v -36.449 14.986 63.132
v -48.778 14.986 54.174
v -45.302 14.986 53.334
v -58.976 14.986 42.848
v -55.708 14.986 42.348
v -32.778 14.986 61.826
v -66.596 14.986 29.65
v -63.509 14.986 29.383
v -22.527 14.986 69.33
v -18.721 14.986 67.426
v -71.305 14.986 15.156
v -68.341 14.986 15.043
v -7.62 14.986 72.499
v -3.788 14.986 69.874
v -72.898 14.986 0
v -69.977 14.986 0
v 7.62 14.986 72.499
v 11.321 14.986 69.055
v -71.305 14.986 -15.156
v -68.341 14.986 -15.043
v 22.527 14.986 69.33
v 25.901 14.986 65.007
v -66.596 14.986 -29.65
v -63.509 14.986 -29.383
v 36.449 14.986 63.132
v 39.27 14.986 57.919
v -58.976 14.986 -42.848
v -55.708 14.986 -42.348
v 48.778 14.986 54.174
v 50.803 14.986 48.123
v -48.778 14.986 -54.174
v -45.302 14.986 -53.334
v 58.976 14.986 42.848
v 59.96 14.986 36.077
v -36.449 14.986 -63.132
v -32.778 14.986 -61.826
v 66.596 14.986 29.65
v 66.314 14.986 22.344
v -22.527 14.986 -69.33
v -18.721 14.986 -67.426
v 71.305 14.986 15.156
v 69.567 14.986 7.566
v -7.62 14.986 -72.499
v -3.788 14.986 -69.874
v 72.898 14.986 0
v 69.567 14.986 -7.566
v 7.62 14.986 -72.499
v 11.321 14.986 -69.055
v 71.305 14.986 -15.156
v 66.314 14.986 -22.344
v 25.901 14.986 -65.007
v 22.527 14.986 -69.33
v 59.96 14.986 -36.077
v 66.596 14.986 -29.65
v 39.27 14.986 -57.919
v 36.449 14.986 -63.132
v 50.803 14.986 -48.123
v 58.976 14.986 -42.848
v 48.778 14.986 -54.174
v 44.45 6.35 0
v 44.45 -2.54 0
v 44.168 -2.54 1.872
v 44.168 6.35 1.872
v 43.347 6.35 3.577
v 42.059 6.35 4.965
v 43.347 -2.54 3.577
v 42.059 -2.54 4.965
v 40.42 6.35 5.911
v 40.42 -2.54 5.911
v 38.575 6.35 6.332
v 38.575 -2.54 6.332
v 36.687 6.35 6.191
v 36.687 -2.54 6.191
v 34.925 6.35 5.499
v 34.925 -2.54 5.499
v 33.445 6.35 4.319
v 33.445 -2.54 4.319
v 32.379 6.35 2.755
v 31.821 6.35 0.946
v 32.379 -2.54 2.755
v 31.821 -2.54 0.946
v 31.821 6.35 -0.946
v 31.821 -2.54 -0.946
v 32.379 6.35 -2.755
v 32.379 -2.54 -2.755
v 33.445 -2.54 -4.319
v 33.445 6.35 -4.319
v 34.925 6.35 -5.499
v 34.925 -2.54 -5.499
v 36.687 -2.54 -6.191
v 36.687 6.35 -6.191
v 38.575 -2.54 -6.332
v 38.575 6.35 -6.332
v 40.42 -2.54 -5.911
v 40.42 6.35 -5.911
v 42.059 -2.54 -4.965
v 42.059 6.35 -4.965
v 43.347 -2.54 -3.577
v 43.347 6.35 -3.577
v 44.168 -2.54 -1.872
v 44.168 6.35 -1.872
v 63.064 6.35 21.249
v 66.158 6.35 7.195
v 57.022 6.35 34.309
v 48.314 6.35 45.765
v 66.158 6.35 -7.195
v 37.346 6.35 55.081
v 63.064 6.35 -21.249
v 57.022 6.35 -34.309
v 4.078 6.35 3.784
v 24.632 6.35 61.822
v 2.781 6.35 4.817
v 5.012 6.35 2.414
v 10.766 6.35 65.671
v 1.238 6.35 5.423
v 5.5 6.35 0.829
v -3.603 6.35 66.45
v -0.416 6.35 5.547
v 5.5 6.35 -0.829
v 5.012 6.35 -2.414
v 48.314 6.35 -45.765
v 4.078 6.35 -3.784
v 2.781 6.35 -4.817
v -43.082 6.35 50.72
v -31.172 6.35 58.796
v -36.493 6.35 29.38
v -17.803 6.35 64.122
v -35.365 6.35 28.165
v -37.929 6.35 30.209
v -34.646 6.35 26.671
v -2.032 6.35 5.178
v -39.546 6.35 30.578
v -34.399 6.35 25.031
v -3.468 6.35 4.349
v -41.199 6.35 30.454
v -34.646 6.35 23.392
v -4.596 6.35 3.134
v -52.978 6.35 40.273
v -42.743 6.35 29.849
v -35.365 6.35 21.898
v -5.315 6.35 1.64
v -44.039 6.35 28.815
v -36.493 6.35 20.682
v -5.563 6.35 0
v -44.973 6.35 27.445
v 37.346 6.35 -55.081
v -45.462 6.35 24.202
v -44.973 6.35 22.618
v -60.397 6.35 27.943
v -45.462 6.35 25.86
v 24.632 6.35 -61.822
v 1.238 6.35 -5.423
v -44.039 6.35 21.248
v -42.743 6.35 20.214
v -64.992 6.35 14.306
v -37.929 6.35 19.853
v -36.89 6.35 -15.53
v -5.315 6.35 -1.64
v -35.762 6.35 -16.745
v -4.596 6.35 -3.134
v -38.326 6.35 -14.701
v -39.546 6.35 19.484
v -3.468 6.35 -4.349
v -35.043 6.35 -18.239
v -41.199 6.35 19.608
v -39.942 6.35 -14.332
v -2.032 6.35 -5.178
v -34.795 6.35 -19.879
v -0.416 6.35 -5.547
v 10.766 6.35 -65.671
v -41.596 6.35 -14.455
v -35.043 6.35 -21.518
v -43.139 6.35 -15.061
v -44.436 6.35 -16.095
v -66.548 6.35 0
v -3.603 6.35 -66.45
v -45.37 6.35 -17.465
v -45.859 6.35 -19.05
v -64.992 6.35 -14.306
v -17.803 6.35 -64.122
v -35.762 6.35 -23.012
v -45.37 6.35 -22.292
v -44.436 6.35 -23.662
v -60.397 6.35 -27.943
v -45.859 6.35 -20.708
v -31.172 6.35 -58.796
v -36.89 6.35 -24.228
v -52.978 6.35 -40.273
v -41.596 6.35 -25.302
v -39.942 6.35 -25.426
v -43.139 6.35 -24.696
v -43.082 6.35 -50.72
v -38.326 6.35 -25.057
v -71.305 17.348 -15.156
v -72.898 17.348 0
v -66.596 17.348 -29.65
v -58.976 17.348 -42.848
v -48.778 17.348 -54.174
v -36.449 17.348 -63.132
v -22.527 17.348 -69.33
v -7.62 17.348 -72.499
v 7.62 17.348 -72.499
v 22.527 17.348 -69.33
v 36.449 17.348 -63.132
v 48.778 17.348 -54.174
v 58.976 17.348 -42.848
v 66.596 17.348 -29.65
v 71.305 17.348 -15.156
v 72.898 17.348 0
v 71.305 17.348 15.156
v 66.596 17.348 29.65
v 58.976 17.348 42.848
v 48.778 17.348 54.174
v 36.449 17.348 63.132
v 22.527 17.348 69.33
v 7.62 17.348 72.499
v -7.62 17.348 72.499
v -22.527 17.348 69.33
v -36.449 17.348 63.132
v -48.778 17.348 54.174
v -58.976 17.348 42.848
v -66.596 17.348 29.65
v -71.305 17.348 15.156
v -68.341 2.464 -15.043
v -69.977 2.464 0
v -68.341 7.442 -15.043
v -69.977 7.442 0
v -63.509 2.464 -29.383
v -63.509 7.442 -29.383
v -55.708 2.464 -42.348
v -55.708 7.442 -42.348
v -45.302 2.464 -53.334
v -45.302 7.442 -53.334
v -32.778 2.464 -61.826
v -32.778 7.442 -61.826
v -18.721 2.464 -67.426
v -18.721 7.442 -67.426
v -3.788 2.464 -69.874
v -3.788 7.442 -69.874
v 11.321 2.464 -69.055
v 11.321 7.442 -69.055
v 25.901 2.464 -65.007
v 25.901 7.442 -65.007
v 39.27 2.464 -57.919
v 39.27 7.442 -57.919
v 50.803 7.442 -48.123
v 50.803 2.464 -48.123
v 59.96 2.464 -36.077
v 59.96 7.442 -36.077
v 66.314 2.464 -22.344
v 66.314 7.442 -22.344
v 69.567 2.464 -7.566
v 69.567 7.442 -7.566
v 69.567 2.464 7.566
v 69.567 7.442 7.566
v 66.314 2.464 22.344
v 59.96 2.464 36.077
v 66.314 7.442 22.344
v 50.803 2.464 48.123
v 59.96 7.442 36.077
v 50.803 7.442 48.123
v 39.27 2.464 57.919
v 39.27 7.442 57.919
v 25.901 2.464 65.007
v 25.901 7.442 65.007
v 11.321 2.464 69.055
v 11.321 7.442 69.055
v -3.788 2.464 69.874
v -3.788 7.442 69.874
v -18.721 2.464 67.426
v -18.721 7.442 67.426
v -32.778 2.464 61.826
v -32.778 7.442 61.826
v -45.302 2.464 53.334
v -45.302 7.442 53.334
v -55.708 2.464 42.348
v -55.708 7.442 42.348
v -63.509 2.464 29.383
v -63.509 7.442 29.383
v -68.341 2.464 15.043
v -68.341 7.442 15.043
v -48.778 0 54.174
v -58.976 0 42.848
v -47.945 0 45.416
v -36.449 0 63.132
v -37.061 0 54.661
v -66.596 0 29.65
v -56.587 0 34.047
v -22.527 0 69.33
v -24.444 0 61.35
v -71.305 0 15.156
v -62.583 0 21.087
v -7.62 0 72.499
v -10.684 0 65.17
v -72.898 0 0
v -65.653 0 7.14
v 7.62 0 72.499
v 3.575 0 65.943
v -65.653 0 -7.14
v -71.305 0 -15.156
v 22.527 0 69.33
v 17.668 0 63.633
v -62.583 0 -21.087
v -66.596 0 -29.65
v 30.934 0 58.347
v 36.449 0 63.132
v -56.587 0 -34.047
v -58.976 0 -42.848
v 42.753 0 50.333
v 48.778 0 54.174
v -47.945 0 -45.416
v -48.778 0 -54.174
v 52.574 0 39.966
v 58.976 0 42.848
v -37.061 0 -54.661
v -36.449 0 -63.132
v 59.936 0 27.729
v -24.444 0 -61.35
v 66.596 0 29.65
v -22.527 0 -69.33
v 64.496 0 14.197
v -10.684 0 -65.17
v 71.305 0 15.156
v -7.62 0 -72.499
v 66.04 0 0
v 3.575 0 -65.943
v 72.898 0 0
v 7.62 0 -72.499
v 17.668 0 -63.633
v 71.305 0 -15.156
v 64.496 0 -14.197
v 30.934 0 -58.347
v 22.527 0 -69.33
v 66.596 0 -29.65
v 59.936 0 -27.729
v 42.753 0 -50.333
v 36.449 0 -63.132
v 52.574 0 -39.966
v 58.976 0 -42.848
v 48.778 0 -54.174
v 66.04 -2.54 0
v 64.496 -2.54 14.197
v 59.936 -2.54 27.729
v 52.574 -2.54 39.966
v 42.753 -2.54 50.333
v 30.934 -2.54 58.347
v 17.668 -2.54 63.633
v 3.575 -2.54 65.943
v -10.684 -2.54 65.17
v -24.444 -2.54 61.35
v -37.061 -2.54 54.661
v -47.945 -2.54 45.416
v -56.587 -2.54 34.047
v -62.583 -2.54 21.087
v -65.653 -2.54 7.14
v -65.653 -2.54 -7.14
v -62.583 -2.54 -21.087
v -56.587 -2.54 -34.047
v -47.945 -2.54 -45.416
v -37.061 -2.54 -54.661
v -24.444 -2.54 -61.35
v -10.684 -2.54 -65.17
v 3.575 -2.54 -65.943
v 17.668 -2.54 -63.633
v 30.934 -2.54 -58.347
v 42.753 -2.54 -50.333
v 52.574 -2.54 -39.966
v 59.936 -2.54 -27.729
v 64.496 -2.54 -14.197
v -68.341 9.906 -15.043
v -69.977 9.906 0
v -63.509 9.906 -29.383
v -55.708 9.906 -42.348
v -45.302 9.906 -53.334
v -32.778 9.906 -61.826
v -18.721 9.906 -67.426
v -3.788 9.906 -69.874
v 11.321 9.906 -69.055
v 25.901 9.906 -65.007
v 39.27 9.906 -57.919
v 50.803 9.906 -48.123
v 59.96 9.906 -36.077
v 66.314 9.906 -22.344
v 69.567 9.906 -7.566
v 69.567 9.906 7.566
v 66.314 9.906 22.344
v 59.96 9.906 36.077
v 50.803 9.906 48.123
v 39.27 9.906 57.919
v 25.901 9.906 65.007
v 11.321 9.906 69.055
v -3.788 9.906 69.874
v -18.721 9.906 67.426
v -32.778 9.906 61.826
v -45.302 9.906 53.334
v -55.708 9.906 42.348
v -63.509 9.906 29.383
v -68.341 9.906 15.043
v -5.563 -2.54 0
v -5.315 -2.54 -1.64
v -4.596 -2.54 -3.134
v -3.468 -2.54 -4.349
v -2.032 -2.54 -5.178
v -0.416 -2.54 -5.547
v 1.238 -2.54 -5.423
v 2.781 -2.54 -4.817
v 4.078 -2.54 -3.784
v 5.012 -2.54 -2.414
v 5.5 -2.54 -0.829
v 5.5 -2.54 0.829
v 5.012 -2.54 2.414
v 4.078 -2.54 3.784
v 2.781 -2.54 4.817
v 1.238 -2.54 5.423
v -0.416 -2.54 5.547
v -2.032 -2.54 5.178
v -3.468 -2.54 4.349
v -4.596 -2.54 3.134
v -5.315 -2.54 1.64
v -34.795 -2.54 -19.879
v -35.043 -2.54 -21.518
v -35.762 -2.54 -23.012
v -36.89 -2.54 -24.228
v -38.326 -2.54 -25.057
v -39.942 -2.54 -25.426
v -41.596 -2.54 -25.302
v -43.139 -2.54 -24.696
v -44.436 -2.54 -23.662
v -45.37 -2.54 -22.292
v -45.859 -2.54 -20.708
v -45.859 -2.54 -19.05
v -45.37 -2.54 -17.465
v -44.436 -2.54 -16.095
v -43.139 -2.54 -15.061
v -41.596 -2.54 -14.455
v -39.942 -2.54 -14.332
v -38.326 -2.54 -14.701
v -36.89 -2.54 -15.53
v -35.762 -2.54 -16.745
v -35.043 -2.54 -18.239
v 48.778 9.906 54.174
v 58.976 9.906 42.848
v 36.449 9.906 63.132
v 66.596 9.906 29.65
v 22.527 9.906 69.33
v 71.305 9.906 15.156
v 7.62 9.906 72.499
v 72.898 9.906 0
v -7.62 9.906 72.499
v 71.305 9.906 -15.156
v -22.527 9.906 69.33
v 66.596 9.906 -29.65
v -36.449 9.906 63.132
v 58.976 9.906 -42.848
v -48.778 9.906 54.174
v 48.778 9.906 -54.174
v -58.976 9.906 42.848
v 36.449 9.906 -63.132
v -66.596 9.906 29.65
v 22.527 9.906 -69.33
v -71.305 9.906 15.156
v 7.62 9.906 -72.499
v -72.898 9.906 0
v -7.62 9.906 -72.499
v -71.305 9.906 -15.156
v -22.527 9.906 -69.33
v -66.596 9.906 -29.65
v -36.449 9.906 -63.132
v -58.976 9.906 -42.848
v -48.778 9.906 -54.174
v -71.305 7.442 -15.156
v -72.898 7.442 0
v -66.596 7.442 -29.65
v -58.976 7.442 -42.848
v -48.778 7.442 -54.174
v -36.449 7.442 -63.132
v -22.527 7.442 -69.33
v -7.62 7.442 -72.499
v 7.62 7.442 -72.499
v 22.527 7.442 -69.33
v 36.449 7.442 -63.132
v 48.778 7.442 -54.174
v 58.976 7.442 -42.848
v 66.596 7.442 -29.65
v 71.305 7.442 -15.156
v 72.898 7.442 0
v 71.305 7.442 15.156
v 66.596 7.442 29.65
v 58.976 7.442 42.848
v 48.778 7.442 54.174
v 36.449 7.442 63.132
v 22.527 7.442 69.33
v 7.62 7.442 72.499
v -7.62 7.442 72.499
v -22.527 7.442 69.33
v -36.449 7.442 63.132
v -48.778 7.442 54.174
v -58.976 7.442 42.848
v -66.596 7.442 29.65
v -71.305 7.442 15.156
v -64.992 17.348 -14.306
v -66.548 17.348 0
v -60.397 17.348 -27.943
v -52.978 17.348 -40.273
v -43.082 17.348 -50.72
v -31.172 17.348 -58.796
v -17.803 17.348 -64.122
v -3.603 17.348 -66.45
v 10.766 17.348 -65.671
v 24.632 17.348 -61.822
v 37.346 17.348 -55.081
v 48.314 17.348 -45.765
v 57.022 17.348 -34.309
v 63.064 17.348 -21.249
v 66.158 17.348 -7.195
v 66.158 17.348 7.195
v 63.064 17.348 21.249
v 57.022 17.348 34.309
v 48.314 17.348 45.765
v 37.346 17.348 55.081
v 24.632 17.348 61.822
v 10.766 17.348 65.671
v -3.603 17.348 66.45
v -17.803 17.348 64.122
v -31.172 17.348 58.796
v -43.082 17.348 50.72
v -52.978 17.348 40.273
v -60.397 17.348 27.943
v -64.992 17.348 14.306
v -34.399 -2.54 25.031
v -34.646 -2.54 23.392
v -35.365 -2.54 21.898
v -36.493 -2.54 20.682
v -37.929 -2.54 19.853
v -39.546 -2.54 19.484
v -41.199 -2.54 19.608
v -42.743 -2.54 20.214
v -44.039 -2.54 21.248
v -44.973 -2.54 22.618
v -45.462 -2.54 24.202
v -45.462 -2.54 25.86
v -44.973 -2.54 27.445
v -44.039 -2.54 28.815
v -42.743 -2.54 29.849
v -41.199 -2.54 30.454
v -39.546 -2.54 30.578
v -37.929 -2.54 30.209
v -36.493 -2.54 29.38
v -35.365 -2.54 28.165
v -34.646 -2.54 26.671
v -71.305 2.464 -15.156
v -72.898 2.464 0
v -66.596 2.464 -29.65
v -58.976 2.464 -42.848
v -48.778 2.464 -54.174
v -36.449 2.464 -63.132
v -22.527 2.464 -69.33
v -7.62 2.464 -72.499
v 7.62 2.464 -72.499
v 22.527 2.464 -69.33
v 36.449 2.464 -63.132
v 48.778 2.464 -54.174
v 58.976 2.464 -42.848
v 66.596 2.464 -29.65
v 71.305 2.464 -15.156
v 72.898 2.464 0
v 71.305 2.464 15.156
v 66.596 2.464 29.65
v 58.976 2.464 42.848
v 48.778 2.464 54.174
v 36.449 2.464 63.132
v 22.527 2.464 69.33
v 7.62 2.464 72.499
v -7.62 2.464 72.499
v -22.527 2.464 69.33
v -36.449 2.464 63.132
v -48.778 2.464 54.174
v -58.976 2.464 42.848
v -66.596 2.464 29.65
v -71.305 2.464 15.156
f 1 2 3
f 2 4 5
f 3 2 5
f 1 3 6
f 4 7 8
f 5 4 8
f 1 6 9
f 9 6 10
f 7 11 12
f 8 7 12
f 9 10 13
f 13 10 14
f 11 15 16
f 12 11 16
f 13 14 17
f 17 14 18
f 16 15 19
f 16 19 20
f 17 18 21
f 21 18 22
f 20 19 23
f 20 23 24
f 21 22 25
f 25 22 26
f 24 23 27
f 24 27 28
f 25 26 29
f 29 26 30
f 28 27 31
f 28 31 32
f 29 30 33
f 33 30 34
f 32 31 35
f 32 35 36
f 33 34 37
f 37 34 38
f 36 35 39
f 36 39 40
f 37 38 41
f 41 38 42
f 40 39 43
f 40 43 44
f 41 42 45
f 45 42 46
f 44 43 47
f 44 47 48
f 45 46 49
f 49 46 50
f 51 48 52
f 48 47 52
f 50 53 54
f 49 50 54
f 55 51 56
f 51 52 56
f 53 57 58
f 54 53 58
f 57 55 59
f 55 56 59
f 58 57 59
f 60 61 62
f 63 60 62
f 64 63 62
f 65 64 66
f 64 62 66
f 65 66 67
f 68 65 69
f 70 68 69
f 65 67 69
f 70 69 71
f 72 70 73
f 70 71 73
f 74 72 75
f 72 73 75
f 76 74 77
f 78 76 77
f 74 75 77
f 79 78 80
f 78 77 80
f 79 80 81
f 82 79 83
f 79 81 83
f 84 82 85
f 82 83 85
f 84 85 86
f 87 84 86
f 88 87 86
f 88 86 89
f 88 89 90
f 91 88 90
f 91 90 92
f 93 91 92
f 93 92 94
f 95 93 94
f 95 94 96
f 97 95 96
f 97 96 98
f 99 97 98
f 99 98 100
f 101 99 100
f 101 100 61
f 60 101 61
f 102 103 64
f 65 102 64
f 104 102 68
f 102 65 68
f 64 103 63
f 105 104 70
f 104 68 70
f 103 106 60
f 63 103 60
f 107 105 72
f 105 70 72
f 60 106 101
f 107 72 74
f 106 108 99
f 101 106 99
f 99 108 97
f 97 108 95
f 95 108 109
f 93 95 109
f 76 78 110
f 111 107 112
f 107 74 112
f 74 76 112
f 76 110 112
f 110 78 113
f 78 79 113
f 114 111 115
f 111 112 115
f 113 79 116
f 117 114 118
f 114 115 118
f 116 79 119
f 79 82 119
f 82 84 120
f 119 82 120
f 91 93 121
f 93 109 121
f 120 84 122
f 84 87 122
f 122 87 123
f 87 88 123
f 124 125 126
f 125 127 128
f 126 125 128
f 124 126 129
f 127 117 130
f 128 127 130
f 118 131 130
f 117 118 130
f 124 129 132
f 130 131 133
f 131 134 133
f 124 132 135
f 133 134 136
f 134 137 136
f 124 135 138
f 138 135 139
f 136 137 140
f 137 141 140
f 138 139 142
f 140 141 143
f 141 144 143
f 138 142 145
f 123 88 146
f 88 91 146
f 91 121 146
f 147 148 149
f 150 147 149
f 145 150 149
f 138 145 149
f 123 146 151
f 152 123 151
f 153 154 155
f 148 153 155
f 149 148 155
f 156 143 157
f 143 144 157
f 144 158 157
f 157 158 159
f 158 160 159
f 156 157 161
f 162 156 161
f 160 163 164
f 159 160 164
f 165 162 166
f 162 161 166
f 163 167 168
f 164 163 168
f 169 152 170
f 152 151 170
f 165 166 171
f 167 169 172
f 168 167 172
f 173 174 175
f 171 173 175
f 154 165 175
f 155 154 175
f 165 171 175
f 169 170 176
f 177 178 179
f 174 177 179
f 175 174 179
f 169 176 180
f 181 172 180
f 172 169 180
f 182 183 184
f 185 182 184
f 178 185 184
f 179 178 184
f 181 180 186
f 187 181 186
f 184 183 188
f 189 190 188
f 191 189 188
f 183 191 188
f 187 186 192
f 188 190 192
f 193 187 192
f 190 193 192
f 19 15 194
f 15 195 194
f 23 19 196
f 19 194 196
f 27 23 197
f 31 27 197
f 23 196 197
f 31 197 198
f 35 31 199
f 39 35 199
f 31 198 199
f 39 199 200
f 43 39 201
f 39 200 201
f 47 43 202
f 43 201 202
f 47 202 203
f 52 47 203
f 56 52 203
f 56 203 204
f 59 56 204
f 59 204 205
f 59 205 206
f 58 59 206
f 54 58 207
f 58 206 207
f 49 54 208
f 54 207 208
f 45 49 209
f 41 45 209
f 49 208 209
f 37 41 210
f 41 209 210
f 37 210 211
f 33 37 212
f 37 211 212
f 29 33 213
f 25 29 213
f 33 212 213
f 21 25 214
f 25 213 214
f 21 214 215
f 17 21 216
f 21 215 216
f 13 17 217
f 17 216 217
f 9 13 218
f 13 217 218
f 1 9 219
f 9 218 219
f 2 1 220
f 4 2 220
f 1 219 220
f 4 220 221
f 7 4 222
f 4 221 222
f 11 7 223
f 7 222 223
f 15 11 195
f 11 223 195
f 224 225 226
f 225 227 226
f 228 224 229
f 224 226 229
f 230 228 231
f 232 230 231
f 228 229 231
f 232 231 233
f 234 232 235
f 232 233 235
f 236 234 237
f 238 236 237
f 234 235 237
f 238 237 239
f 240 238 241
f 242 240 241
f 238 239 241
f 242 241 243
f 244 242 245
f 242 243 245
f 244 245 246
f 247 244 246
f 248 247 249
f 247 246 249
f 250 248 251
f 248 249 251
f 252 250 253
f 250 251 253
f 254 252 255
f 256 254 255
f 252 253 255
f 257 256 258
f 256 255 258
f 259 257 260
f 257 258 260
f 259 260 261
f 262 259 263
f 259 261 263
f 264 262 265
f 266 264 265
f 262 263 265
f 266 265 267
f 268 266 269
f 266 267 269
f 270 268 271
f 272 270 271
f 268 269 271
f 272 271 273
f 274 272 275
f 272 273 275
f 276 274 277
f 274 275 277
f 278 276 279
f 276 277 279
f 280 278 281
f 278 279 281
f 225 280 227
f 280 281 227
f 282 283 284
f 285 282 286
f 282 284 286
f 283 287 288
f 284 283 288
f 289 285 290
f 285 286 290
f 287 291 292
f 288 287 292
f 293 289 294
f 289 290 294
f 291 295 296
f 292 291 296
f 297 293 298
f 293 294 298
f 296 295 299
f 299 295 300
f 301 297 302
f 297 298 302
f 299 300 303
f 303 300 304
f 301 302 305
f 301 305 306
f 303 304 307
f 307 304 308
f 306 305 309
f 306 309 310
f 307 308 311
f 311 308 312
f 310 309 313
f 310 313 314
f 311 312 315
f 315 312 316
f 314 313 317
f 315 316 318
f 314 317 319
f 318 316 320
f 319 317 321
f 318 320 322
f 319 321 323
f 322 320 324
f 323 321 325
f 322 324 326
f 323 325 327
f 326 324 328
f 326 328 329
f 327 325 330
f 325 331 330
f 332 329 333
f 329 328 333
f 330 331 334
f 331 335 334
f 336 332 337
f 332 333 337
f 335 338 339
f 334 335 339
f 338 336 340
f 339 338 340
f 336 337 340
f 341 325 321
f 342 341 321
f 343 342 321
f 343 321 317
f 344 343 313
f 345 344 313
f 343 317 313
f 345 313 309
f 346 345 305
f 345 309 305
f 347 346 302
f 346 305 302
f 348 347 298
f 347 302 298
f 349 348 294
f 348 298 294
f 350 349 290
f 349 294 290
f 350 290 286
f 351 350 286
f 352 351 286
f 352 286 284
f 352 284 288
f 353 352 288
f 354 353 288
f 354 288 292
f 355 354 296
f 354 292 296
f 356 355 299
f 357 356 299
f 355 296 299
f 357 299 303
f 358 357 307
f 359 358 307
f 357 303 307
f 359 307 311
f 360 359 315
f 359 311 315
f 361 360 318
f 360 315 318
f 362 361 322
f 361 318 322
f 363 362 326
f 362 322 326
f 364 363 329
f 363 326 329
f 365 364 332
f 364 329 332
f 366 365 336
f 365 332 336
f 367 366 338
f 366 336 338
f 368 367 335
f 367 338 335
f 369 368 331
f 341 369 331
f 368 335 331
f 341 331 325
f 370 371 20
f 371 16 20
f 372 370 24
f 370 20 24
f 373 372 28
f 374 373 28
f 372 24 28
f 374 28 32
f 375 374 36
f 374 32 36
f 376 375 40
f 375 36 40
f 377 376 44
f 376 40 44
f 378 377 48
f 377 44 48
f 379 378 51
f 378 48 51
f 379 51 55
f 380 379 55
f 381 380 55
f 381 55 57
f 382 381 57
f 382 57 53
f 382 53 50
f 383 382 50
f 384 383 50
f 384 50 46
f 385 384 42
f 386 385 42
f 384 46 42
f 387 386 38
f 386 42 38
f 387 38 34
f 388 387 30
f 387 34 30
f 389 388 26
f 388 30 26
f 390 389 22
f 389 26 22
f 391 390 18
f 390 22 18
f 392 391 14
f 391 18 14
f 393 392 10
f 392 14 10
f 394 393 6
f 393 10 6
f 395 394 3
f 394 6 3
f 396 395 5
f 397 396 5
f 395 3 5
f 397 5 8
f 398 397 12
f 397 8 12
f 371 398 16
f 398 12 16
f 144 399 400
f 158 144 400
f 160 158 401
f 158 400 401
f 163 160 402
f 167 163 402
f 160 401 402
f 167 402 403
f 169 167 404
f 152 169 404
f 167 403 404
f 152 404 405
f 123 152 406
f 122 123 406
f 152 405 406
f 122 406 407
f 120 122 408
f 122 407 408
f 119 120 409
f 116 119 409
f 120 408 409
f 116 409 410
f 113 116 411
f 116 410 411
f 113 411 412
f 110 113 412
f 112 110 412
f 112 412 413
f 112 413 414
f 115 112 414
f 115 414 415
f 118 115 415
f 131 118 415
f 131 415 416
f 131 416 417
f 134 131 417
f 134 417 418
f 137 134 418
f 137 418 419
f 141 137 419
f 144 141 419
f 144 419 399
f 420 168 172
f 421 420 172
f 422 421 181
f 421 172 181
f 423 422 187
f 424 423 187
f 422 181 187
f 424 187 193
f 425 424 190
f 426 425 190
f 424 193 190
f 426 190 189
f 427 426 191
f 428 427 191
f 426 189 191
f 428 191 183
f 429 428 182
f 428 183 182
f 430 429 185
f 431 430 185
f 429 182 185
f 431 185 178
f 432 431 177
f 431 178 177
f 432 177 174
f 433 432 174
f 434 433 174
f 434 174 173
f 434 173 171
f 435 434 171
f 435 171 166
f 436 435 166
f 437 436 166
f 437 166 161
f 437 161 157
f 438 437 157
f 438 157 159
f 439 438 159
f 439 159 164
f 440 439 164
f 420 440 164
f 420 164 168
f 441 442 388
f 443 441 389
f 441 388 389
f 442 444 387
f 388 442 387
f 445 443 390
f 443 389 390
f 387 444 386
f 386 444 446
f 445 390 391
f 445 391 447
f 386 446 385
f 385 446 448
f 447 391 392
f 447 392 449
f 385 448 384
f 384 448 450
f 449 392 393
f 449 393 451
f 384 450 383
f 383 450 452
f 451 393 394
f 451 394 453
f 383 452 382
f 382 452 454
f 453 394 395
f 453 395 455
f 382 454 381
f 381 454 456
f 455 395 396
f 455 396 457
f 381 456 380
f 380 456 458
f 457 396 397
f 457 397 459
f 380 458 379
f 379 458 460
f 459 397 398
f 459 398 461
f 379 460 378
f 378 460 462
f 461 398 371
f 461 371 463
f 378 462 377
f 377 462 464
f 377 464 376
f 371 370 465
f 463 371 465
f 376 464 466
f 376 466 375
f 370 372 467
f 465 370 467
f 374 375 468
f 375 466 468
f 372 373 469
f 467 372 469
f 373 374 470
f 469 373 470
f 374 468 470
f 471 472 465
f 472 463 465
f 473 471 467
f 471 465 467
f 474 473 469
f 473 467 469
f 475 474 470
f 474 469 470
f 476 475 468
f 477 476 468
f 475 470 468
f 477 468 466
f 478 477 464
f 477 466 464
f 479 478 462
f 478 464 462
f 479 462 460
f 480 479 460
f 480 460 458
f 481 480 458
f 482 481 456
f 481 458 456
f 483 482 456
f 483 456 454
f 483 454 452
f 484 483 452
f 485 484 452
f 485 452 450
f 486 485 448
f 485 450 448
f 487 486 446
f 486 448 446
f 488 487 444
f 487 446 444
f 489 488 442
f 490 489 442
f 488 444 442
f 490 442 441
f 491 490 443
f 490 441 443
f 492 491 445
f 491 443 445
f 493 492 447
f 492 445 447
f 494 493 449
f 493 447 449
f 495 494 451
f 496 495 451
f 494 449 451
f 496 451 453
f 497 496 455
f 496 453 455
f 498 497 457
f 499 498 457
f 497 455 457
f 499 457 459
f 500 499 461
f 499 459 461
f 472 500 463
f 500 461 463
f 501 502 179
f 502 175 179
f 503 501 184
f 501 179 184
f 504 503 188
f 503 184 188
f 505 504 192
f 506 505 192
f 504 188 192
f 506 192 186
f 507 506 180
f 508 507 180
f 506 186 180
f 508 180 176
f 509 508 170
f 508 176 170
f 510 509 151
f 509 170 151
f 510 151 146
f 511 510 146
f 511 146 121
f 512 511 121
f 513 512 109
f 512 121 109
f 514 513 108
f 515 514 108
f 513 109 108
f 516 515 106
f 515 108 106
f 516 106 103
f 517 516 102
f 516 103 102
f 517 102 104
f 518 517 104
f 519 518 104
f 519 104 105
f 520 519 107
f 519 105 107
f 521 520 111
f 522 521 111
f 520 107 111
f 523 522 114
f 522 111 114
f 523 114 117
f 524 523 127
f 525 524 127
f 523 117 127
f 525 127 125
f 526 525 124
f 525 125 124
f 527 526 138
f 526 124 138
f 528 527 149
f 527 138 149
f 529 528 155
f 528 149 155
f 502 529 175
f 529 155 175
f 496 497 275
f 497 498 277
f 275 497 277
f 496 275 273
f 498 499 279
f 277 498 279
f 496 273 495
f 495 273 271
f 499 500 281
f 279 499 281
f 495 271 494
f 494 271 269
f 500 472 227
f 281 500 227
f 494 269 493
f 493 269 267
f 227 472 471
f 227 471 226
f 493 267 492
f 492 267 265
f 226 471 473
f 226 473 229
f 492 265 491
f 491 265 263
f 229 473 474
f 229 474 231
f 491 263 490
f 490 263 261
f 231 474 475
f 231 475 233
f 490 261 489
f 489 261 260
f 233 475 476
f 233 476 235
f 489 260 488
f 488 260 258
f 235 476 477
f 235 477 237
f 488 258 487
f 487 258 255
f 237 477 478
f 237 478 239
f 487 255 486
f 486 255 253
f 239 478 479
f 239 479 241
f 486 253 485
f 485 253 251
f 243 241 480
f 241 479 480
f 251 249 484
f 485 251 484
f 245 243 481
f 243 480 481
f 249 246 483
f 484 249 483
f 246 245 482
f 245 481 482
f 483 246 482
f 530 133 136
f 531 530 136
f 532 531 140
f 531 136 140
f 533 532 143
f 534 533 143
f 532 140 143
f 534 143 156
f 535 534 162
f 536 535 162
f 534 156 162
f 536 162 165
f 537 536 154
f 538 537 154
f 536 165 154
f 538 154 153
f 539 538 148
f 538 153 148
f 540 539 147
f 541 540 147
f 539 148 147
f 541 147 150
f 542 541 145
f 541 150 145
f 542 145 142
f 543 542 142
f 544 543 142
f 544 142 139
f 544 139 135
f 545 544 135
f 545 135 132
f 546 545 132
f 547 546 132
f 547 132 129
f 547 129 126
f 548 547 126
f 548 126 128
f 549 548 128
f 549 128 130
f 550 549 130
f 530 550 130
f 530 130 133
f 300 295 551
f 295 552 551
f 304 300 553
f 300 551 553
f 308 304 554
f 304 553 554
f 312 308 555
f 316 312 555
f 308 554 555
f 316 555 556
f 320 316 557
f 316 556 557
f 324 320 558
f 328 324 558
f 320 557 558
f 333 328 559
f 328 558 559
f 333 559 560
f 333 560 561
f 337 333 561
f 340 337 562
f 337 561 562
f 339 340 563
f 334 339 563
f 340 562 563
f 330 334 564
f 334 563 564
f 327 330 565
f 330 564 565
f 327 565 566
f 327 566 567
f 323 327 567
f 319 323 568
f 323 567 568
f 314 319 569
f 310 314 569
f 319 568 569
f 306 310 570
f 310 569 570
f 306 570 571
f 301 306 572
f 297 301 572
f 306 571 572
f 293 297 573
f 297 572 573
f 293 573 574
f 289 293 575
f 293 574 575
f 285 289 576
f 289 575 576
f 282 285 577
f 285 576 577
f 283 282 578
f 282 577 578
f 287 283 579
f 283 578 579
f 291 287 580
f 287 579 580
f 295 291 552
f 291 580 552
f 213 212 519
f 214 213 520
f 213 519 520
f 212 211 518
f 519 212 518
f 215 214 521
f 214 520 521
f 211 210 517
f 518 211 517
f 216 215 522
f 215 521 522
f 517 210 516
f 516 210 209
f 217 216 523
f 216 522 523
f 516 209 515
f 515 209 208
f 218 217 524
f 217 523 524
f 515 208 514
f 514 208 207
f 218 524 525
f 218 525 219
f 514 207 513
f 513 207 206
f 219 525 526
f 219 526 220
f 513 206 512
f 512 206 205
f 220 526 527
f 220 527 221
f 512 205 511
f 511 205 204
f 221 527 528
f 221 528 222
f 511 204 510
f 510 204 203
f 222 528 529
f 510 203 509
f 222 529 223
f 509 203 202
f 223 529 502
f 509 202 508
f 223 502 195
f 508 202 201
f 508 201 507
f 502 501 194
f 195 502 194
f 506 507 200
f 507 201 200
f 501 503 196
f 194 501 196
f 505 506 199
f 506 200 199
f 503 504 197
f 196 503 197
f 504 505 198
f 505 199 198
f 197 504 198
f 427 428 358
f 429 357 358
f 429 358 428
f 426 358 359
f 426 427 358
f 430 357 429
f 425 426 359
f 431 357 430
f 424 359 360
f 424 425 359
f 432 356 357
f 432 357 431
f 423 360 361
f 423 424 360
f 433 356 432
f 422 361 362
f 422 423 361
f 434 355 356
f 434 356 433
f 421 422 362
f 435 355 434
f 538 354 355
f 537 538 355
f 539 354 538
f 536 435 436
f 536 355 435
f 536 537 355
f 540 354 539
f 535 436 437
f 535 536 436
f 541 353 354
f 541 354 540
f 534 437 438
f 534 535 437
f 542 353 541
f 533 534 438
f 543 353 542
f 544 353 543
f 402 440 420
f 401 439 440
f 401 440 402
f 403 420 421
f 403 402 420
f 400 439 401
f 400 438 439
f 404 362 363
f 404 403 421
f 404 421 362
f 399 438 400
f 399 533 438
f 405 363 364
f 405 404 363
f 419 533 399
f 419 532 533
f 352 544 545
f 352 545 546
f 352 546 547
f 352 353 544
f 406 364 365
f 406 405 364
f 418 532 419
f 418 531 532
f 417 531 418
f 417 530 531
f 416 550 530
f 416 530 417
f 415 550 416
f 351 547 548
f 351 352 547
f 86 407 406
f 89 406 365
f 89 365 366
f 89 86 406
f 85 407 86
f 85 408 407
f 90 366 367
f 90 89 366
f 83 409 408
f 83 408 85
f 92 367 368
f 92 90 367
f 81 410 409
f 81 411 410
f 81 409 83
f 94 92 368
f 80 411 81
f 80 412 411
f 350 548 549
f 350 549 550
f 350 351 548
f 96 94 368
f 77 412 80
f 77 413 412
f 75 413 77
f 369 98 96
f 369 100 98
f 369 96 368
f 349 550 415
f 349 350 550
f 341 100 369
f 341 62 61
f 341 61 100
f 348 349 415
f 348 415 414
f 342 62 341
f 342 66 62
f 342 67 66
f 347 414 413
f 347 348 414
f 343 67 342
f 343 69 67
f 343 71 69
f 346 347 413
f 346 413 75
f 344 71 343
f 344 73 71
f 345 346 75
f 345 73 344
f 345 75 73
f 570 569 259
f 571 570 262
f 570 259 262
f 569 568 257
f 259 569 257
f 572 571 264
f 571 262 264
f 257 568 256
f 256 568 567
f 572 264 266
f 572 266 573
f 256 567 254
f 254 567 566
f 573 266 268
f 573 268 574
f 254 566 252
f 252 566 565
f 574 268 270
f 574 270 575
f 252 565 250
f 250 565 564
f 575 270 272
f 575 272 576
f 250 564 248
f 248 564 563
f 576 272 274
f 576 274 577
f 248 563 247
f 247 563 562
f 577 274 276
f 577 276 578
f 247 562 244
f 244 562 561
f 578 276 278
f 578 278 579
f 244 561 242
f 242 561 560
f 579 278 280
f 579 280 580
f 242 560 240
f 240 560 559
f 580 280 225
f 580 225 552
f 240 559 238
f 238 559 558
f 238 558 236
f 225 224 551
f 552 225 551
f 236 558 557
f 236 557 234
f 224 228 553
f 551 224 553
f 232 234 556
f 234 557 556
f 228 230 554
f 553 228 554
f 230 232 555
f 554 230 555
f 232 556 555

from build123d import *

# Parameters (mm, degrees)
SKETCH6_R                                = 66.04
BOSS_EXTRUDE1_DEPTH                      = 2.54
PIPE_TAP_DRILL_FOR_1_4_TAP_GN2_D         = 11.1252
SKETCH7_R                                = 6.35
CUT_EXTRUDE1_SIPHON_DEPTH                = 105.994177492
PIPE_TAP_DRILL_FOR_1_4_TAP_RELIEF_VALV_D = 11.1252
PIPE_TAP_DRILL_FOR_1_4_TAP_VENT_VALVE_D  = 11.1252


with BuildPart() as part:
    # Sketch1 → Revolve1 (revolve)
    with BuildSketch(Plane.XY, mode=Mode.PRIVATE) as revolve1_sk:
        Polygon((0, 0), (72.898, 0), (72.898, 2.4638), (69.977, 2.4638), (69.977, 7.4422), (72.898, 7.4422), (72.898, 9.906), (69.977, 9.906), (69.977, 14.986), (72.898, 14.986), (72.898, 17.3482), (66.548, 17.3482), (66.548, 6.35), (0, 6.35), align=None)
    revolve(revolve1_sk.sketch.rotate(Axis((0, 48.192213231, 0), (0, -1, 0)), 180), axis=Axis((0, 48.192213231, 0), (0, -1, 0)))

    # Sketch6 → Boss-Extrude1 (add)
    with BuildSketch(Plane.XZ):
        Circle(SKETCH6_R)
    extrude(amount=BOSS_EXTRUDE1_DEPTH)

    # Pipe Tap Drill for 1/4 Tap - GN2 (through all)
    with Locations(Plane(origin=(0, 6.35, 0), x_dir=(1, 0, 0), z_dir=(0, 1, 0))):
        with Locations((0, 0)):
            Hole(PIPE_TAP_DRILL_FOR_1_4_TAP_GN2_D / 2)

    # Sketch7 → Cut-Extrude1-Siphon (cut, through all)
    with BuildSketch(Plane(origin=(0, -2.54, 0), x_dir=(-1, 0, 0), z_dir=(0, -1, 0))):
        with Locations(Location((-38.1, 0, 0), (0, 0, 180))):
            Circle(SKETCH7_R)
    extrude(amount=-CUT_EXTRUDE1_SIPHON_DEPTH, mode=Mode.SUBTRACT)

    # Pipe Tap Drill for 1/4 Tap - Relief Valve (through all)
    with Locations(Plane(origin=(0, -2.54, 0), x_dir=(-1, 0, 0), z_dir=(0, -1, 0))):
        with Locations((40.358041229, 19.878625199)):
            Hole(PIPE_TAP_DRILL_FOR_1_4_TAP_RELIEF_VALV_D / 2)

    # Pipe Tap Drill for 1/4 Tap - Vent Valve (through all)
    with Locations(Plane(origin=(0, -2.54, 0), x_dir=(-1, 0, 0), z_dir=(0, -1, 0))):
        with Locations((39.961427255, -25.031151171)):
            Hole(PIPE_TAP_DRILL_FOR_1_4_TAP_VENT_VALVE_D / 2)


solid = part.part
